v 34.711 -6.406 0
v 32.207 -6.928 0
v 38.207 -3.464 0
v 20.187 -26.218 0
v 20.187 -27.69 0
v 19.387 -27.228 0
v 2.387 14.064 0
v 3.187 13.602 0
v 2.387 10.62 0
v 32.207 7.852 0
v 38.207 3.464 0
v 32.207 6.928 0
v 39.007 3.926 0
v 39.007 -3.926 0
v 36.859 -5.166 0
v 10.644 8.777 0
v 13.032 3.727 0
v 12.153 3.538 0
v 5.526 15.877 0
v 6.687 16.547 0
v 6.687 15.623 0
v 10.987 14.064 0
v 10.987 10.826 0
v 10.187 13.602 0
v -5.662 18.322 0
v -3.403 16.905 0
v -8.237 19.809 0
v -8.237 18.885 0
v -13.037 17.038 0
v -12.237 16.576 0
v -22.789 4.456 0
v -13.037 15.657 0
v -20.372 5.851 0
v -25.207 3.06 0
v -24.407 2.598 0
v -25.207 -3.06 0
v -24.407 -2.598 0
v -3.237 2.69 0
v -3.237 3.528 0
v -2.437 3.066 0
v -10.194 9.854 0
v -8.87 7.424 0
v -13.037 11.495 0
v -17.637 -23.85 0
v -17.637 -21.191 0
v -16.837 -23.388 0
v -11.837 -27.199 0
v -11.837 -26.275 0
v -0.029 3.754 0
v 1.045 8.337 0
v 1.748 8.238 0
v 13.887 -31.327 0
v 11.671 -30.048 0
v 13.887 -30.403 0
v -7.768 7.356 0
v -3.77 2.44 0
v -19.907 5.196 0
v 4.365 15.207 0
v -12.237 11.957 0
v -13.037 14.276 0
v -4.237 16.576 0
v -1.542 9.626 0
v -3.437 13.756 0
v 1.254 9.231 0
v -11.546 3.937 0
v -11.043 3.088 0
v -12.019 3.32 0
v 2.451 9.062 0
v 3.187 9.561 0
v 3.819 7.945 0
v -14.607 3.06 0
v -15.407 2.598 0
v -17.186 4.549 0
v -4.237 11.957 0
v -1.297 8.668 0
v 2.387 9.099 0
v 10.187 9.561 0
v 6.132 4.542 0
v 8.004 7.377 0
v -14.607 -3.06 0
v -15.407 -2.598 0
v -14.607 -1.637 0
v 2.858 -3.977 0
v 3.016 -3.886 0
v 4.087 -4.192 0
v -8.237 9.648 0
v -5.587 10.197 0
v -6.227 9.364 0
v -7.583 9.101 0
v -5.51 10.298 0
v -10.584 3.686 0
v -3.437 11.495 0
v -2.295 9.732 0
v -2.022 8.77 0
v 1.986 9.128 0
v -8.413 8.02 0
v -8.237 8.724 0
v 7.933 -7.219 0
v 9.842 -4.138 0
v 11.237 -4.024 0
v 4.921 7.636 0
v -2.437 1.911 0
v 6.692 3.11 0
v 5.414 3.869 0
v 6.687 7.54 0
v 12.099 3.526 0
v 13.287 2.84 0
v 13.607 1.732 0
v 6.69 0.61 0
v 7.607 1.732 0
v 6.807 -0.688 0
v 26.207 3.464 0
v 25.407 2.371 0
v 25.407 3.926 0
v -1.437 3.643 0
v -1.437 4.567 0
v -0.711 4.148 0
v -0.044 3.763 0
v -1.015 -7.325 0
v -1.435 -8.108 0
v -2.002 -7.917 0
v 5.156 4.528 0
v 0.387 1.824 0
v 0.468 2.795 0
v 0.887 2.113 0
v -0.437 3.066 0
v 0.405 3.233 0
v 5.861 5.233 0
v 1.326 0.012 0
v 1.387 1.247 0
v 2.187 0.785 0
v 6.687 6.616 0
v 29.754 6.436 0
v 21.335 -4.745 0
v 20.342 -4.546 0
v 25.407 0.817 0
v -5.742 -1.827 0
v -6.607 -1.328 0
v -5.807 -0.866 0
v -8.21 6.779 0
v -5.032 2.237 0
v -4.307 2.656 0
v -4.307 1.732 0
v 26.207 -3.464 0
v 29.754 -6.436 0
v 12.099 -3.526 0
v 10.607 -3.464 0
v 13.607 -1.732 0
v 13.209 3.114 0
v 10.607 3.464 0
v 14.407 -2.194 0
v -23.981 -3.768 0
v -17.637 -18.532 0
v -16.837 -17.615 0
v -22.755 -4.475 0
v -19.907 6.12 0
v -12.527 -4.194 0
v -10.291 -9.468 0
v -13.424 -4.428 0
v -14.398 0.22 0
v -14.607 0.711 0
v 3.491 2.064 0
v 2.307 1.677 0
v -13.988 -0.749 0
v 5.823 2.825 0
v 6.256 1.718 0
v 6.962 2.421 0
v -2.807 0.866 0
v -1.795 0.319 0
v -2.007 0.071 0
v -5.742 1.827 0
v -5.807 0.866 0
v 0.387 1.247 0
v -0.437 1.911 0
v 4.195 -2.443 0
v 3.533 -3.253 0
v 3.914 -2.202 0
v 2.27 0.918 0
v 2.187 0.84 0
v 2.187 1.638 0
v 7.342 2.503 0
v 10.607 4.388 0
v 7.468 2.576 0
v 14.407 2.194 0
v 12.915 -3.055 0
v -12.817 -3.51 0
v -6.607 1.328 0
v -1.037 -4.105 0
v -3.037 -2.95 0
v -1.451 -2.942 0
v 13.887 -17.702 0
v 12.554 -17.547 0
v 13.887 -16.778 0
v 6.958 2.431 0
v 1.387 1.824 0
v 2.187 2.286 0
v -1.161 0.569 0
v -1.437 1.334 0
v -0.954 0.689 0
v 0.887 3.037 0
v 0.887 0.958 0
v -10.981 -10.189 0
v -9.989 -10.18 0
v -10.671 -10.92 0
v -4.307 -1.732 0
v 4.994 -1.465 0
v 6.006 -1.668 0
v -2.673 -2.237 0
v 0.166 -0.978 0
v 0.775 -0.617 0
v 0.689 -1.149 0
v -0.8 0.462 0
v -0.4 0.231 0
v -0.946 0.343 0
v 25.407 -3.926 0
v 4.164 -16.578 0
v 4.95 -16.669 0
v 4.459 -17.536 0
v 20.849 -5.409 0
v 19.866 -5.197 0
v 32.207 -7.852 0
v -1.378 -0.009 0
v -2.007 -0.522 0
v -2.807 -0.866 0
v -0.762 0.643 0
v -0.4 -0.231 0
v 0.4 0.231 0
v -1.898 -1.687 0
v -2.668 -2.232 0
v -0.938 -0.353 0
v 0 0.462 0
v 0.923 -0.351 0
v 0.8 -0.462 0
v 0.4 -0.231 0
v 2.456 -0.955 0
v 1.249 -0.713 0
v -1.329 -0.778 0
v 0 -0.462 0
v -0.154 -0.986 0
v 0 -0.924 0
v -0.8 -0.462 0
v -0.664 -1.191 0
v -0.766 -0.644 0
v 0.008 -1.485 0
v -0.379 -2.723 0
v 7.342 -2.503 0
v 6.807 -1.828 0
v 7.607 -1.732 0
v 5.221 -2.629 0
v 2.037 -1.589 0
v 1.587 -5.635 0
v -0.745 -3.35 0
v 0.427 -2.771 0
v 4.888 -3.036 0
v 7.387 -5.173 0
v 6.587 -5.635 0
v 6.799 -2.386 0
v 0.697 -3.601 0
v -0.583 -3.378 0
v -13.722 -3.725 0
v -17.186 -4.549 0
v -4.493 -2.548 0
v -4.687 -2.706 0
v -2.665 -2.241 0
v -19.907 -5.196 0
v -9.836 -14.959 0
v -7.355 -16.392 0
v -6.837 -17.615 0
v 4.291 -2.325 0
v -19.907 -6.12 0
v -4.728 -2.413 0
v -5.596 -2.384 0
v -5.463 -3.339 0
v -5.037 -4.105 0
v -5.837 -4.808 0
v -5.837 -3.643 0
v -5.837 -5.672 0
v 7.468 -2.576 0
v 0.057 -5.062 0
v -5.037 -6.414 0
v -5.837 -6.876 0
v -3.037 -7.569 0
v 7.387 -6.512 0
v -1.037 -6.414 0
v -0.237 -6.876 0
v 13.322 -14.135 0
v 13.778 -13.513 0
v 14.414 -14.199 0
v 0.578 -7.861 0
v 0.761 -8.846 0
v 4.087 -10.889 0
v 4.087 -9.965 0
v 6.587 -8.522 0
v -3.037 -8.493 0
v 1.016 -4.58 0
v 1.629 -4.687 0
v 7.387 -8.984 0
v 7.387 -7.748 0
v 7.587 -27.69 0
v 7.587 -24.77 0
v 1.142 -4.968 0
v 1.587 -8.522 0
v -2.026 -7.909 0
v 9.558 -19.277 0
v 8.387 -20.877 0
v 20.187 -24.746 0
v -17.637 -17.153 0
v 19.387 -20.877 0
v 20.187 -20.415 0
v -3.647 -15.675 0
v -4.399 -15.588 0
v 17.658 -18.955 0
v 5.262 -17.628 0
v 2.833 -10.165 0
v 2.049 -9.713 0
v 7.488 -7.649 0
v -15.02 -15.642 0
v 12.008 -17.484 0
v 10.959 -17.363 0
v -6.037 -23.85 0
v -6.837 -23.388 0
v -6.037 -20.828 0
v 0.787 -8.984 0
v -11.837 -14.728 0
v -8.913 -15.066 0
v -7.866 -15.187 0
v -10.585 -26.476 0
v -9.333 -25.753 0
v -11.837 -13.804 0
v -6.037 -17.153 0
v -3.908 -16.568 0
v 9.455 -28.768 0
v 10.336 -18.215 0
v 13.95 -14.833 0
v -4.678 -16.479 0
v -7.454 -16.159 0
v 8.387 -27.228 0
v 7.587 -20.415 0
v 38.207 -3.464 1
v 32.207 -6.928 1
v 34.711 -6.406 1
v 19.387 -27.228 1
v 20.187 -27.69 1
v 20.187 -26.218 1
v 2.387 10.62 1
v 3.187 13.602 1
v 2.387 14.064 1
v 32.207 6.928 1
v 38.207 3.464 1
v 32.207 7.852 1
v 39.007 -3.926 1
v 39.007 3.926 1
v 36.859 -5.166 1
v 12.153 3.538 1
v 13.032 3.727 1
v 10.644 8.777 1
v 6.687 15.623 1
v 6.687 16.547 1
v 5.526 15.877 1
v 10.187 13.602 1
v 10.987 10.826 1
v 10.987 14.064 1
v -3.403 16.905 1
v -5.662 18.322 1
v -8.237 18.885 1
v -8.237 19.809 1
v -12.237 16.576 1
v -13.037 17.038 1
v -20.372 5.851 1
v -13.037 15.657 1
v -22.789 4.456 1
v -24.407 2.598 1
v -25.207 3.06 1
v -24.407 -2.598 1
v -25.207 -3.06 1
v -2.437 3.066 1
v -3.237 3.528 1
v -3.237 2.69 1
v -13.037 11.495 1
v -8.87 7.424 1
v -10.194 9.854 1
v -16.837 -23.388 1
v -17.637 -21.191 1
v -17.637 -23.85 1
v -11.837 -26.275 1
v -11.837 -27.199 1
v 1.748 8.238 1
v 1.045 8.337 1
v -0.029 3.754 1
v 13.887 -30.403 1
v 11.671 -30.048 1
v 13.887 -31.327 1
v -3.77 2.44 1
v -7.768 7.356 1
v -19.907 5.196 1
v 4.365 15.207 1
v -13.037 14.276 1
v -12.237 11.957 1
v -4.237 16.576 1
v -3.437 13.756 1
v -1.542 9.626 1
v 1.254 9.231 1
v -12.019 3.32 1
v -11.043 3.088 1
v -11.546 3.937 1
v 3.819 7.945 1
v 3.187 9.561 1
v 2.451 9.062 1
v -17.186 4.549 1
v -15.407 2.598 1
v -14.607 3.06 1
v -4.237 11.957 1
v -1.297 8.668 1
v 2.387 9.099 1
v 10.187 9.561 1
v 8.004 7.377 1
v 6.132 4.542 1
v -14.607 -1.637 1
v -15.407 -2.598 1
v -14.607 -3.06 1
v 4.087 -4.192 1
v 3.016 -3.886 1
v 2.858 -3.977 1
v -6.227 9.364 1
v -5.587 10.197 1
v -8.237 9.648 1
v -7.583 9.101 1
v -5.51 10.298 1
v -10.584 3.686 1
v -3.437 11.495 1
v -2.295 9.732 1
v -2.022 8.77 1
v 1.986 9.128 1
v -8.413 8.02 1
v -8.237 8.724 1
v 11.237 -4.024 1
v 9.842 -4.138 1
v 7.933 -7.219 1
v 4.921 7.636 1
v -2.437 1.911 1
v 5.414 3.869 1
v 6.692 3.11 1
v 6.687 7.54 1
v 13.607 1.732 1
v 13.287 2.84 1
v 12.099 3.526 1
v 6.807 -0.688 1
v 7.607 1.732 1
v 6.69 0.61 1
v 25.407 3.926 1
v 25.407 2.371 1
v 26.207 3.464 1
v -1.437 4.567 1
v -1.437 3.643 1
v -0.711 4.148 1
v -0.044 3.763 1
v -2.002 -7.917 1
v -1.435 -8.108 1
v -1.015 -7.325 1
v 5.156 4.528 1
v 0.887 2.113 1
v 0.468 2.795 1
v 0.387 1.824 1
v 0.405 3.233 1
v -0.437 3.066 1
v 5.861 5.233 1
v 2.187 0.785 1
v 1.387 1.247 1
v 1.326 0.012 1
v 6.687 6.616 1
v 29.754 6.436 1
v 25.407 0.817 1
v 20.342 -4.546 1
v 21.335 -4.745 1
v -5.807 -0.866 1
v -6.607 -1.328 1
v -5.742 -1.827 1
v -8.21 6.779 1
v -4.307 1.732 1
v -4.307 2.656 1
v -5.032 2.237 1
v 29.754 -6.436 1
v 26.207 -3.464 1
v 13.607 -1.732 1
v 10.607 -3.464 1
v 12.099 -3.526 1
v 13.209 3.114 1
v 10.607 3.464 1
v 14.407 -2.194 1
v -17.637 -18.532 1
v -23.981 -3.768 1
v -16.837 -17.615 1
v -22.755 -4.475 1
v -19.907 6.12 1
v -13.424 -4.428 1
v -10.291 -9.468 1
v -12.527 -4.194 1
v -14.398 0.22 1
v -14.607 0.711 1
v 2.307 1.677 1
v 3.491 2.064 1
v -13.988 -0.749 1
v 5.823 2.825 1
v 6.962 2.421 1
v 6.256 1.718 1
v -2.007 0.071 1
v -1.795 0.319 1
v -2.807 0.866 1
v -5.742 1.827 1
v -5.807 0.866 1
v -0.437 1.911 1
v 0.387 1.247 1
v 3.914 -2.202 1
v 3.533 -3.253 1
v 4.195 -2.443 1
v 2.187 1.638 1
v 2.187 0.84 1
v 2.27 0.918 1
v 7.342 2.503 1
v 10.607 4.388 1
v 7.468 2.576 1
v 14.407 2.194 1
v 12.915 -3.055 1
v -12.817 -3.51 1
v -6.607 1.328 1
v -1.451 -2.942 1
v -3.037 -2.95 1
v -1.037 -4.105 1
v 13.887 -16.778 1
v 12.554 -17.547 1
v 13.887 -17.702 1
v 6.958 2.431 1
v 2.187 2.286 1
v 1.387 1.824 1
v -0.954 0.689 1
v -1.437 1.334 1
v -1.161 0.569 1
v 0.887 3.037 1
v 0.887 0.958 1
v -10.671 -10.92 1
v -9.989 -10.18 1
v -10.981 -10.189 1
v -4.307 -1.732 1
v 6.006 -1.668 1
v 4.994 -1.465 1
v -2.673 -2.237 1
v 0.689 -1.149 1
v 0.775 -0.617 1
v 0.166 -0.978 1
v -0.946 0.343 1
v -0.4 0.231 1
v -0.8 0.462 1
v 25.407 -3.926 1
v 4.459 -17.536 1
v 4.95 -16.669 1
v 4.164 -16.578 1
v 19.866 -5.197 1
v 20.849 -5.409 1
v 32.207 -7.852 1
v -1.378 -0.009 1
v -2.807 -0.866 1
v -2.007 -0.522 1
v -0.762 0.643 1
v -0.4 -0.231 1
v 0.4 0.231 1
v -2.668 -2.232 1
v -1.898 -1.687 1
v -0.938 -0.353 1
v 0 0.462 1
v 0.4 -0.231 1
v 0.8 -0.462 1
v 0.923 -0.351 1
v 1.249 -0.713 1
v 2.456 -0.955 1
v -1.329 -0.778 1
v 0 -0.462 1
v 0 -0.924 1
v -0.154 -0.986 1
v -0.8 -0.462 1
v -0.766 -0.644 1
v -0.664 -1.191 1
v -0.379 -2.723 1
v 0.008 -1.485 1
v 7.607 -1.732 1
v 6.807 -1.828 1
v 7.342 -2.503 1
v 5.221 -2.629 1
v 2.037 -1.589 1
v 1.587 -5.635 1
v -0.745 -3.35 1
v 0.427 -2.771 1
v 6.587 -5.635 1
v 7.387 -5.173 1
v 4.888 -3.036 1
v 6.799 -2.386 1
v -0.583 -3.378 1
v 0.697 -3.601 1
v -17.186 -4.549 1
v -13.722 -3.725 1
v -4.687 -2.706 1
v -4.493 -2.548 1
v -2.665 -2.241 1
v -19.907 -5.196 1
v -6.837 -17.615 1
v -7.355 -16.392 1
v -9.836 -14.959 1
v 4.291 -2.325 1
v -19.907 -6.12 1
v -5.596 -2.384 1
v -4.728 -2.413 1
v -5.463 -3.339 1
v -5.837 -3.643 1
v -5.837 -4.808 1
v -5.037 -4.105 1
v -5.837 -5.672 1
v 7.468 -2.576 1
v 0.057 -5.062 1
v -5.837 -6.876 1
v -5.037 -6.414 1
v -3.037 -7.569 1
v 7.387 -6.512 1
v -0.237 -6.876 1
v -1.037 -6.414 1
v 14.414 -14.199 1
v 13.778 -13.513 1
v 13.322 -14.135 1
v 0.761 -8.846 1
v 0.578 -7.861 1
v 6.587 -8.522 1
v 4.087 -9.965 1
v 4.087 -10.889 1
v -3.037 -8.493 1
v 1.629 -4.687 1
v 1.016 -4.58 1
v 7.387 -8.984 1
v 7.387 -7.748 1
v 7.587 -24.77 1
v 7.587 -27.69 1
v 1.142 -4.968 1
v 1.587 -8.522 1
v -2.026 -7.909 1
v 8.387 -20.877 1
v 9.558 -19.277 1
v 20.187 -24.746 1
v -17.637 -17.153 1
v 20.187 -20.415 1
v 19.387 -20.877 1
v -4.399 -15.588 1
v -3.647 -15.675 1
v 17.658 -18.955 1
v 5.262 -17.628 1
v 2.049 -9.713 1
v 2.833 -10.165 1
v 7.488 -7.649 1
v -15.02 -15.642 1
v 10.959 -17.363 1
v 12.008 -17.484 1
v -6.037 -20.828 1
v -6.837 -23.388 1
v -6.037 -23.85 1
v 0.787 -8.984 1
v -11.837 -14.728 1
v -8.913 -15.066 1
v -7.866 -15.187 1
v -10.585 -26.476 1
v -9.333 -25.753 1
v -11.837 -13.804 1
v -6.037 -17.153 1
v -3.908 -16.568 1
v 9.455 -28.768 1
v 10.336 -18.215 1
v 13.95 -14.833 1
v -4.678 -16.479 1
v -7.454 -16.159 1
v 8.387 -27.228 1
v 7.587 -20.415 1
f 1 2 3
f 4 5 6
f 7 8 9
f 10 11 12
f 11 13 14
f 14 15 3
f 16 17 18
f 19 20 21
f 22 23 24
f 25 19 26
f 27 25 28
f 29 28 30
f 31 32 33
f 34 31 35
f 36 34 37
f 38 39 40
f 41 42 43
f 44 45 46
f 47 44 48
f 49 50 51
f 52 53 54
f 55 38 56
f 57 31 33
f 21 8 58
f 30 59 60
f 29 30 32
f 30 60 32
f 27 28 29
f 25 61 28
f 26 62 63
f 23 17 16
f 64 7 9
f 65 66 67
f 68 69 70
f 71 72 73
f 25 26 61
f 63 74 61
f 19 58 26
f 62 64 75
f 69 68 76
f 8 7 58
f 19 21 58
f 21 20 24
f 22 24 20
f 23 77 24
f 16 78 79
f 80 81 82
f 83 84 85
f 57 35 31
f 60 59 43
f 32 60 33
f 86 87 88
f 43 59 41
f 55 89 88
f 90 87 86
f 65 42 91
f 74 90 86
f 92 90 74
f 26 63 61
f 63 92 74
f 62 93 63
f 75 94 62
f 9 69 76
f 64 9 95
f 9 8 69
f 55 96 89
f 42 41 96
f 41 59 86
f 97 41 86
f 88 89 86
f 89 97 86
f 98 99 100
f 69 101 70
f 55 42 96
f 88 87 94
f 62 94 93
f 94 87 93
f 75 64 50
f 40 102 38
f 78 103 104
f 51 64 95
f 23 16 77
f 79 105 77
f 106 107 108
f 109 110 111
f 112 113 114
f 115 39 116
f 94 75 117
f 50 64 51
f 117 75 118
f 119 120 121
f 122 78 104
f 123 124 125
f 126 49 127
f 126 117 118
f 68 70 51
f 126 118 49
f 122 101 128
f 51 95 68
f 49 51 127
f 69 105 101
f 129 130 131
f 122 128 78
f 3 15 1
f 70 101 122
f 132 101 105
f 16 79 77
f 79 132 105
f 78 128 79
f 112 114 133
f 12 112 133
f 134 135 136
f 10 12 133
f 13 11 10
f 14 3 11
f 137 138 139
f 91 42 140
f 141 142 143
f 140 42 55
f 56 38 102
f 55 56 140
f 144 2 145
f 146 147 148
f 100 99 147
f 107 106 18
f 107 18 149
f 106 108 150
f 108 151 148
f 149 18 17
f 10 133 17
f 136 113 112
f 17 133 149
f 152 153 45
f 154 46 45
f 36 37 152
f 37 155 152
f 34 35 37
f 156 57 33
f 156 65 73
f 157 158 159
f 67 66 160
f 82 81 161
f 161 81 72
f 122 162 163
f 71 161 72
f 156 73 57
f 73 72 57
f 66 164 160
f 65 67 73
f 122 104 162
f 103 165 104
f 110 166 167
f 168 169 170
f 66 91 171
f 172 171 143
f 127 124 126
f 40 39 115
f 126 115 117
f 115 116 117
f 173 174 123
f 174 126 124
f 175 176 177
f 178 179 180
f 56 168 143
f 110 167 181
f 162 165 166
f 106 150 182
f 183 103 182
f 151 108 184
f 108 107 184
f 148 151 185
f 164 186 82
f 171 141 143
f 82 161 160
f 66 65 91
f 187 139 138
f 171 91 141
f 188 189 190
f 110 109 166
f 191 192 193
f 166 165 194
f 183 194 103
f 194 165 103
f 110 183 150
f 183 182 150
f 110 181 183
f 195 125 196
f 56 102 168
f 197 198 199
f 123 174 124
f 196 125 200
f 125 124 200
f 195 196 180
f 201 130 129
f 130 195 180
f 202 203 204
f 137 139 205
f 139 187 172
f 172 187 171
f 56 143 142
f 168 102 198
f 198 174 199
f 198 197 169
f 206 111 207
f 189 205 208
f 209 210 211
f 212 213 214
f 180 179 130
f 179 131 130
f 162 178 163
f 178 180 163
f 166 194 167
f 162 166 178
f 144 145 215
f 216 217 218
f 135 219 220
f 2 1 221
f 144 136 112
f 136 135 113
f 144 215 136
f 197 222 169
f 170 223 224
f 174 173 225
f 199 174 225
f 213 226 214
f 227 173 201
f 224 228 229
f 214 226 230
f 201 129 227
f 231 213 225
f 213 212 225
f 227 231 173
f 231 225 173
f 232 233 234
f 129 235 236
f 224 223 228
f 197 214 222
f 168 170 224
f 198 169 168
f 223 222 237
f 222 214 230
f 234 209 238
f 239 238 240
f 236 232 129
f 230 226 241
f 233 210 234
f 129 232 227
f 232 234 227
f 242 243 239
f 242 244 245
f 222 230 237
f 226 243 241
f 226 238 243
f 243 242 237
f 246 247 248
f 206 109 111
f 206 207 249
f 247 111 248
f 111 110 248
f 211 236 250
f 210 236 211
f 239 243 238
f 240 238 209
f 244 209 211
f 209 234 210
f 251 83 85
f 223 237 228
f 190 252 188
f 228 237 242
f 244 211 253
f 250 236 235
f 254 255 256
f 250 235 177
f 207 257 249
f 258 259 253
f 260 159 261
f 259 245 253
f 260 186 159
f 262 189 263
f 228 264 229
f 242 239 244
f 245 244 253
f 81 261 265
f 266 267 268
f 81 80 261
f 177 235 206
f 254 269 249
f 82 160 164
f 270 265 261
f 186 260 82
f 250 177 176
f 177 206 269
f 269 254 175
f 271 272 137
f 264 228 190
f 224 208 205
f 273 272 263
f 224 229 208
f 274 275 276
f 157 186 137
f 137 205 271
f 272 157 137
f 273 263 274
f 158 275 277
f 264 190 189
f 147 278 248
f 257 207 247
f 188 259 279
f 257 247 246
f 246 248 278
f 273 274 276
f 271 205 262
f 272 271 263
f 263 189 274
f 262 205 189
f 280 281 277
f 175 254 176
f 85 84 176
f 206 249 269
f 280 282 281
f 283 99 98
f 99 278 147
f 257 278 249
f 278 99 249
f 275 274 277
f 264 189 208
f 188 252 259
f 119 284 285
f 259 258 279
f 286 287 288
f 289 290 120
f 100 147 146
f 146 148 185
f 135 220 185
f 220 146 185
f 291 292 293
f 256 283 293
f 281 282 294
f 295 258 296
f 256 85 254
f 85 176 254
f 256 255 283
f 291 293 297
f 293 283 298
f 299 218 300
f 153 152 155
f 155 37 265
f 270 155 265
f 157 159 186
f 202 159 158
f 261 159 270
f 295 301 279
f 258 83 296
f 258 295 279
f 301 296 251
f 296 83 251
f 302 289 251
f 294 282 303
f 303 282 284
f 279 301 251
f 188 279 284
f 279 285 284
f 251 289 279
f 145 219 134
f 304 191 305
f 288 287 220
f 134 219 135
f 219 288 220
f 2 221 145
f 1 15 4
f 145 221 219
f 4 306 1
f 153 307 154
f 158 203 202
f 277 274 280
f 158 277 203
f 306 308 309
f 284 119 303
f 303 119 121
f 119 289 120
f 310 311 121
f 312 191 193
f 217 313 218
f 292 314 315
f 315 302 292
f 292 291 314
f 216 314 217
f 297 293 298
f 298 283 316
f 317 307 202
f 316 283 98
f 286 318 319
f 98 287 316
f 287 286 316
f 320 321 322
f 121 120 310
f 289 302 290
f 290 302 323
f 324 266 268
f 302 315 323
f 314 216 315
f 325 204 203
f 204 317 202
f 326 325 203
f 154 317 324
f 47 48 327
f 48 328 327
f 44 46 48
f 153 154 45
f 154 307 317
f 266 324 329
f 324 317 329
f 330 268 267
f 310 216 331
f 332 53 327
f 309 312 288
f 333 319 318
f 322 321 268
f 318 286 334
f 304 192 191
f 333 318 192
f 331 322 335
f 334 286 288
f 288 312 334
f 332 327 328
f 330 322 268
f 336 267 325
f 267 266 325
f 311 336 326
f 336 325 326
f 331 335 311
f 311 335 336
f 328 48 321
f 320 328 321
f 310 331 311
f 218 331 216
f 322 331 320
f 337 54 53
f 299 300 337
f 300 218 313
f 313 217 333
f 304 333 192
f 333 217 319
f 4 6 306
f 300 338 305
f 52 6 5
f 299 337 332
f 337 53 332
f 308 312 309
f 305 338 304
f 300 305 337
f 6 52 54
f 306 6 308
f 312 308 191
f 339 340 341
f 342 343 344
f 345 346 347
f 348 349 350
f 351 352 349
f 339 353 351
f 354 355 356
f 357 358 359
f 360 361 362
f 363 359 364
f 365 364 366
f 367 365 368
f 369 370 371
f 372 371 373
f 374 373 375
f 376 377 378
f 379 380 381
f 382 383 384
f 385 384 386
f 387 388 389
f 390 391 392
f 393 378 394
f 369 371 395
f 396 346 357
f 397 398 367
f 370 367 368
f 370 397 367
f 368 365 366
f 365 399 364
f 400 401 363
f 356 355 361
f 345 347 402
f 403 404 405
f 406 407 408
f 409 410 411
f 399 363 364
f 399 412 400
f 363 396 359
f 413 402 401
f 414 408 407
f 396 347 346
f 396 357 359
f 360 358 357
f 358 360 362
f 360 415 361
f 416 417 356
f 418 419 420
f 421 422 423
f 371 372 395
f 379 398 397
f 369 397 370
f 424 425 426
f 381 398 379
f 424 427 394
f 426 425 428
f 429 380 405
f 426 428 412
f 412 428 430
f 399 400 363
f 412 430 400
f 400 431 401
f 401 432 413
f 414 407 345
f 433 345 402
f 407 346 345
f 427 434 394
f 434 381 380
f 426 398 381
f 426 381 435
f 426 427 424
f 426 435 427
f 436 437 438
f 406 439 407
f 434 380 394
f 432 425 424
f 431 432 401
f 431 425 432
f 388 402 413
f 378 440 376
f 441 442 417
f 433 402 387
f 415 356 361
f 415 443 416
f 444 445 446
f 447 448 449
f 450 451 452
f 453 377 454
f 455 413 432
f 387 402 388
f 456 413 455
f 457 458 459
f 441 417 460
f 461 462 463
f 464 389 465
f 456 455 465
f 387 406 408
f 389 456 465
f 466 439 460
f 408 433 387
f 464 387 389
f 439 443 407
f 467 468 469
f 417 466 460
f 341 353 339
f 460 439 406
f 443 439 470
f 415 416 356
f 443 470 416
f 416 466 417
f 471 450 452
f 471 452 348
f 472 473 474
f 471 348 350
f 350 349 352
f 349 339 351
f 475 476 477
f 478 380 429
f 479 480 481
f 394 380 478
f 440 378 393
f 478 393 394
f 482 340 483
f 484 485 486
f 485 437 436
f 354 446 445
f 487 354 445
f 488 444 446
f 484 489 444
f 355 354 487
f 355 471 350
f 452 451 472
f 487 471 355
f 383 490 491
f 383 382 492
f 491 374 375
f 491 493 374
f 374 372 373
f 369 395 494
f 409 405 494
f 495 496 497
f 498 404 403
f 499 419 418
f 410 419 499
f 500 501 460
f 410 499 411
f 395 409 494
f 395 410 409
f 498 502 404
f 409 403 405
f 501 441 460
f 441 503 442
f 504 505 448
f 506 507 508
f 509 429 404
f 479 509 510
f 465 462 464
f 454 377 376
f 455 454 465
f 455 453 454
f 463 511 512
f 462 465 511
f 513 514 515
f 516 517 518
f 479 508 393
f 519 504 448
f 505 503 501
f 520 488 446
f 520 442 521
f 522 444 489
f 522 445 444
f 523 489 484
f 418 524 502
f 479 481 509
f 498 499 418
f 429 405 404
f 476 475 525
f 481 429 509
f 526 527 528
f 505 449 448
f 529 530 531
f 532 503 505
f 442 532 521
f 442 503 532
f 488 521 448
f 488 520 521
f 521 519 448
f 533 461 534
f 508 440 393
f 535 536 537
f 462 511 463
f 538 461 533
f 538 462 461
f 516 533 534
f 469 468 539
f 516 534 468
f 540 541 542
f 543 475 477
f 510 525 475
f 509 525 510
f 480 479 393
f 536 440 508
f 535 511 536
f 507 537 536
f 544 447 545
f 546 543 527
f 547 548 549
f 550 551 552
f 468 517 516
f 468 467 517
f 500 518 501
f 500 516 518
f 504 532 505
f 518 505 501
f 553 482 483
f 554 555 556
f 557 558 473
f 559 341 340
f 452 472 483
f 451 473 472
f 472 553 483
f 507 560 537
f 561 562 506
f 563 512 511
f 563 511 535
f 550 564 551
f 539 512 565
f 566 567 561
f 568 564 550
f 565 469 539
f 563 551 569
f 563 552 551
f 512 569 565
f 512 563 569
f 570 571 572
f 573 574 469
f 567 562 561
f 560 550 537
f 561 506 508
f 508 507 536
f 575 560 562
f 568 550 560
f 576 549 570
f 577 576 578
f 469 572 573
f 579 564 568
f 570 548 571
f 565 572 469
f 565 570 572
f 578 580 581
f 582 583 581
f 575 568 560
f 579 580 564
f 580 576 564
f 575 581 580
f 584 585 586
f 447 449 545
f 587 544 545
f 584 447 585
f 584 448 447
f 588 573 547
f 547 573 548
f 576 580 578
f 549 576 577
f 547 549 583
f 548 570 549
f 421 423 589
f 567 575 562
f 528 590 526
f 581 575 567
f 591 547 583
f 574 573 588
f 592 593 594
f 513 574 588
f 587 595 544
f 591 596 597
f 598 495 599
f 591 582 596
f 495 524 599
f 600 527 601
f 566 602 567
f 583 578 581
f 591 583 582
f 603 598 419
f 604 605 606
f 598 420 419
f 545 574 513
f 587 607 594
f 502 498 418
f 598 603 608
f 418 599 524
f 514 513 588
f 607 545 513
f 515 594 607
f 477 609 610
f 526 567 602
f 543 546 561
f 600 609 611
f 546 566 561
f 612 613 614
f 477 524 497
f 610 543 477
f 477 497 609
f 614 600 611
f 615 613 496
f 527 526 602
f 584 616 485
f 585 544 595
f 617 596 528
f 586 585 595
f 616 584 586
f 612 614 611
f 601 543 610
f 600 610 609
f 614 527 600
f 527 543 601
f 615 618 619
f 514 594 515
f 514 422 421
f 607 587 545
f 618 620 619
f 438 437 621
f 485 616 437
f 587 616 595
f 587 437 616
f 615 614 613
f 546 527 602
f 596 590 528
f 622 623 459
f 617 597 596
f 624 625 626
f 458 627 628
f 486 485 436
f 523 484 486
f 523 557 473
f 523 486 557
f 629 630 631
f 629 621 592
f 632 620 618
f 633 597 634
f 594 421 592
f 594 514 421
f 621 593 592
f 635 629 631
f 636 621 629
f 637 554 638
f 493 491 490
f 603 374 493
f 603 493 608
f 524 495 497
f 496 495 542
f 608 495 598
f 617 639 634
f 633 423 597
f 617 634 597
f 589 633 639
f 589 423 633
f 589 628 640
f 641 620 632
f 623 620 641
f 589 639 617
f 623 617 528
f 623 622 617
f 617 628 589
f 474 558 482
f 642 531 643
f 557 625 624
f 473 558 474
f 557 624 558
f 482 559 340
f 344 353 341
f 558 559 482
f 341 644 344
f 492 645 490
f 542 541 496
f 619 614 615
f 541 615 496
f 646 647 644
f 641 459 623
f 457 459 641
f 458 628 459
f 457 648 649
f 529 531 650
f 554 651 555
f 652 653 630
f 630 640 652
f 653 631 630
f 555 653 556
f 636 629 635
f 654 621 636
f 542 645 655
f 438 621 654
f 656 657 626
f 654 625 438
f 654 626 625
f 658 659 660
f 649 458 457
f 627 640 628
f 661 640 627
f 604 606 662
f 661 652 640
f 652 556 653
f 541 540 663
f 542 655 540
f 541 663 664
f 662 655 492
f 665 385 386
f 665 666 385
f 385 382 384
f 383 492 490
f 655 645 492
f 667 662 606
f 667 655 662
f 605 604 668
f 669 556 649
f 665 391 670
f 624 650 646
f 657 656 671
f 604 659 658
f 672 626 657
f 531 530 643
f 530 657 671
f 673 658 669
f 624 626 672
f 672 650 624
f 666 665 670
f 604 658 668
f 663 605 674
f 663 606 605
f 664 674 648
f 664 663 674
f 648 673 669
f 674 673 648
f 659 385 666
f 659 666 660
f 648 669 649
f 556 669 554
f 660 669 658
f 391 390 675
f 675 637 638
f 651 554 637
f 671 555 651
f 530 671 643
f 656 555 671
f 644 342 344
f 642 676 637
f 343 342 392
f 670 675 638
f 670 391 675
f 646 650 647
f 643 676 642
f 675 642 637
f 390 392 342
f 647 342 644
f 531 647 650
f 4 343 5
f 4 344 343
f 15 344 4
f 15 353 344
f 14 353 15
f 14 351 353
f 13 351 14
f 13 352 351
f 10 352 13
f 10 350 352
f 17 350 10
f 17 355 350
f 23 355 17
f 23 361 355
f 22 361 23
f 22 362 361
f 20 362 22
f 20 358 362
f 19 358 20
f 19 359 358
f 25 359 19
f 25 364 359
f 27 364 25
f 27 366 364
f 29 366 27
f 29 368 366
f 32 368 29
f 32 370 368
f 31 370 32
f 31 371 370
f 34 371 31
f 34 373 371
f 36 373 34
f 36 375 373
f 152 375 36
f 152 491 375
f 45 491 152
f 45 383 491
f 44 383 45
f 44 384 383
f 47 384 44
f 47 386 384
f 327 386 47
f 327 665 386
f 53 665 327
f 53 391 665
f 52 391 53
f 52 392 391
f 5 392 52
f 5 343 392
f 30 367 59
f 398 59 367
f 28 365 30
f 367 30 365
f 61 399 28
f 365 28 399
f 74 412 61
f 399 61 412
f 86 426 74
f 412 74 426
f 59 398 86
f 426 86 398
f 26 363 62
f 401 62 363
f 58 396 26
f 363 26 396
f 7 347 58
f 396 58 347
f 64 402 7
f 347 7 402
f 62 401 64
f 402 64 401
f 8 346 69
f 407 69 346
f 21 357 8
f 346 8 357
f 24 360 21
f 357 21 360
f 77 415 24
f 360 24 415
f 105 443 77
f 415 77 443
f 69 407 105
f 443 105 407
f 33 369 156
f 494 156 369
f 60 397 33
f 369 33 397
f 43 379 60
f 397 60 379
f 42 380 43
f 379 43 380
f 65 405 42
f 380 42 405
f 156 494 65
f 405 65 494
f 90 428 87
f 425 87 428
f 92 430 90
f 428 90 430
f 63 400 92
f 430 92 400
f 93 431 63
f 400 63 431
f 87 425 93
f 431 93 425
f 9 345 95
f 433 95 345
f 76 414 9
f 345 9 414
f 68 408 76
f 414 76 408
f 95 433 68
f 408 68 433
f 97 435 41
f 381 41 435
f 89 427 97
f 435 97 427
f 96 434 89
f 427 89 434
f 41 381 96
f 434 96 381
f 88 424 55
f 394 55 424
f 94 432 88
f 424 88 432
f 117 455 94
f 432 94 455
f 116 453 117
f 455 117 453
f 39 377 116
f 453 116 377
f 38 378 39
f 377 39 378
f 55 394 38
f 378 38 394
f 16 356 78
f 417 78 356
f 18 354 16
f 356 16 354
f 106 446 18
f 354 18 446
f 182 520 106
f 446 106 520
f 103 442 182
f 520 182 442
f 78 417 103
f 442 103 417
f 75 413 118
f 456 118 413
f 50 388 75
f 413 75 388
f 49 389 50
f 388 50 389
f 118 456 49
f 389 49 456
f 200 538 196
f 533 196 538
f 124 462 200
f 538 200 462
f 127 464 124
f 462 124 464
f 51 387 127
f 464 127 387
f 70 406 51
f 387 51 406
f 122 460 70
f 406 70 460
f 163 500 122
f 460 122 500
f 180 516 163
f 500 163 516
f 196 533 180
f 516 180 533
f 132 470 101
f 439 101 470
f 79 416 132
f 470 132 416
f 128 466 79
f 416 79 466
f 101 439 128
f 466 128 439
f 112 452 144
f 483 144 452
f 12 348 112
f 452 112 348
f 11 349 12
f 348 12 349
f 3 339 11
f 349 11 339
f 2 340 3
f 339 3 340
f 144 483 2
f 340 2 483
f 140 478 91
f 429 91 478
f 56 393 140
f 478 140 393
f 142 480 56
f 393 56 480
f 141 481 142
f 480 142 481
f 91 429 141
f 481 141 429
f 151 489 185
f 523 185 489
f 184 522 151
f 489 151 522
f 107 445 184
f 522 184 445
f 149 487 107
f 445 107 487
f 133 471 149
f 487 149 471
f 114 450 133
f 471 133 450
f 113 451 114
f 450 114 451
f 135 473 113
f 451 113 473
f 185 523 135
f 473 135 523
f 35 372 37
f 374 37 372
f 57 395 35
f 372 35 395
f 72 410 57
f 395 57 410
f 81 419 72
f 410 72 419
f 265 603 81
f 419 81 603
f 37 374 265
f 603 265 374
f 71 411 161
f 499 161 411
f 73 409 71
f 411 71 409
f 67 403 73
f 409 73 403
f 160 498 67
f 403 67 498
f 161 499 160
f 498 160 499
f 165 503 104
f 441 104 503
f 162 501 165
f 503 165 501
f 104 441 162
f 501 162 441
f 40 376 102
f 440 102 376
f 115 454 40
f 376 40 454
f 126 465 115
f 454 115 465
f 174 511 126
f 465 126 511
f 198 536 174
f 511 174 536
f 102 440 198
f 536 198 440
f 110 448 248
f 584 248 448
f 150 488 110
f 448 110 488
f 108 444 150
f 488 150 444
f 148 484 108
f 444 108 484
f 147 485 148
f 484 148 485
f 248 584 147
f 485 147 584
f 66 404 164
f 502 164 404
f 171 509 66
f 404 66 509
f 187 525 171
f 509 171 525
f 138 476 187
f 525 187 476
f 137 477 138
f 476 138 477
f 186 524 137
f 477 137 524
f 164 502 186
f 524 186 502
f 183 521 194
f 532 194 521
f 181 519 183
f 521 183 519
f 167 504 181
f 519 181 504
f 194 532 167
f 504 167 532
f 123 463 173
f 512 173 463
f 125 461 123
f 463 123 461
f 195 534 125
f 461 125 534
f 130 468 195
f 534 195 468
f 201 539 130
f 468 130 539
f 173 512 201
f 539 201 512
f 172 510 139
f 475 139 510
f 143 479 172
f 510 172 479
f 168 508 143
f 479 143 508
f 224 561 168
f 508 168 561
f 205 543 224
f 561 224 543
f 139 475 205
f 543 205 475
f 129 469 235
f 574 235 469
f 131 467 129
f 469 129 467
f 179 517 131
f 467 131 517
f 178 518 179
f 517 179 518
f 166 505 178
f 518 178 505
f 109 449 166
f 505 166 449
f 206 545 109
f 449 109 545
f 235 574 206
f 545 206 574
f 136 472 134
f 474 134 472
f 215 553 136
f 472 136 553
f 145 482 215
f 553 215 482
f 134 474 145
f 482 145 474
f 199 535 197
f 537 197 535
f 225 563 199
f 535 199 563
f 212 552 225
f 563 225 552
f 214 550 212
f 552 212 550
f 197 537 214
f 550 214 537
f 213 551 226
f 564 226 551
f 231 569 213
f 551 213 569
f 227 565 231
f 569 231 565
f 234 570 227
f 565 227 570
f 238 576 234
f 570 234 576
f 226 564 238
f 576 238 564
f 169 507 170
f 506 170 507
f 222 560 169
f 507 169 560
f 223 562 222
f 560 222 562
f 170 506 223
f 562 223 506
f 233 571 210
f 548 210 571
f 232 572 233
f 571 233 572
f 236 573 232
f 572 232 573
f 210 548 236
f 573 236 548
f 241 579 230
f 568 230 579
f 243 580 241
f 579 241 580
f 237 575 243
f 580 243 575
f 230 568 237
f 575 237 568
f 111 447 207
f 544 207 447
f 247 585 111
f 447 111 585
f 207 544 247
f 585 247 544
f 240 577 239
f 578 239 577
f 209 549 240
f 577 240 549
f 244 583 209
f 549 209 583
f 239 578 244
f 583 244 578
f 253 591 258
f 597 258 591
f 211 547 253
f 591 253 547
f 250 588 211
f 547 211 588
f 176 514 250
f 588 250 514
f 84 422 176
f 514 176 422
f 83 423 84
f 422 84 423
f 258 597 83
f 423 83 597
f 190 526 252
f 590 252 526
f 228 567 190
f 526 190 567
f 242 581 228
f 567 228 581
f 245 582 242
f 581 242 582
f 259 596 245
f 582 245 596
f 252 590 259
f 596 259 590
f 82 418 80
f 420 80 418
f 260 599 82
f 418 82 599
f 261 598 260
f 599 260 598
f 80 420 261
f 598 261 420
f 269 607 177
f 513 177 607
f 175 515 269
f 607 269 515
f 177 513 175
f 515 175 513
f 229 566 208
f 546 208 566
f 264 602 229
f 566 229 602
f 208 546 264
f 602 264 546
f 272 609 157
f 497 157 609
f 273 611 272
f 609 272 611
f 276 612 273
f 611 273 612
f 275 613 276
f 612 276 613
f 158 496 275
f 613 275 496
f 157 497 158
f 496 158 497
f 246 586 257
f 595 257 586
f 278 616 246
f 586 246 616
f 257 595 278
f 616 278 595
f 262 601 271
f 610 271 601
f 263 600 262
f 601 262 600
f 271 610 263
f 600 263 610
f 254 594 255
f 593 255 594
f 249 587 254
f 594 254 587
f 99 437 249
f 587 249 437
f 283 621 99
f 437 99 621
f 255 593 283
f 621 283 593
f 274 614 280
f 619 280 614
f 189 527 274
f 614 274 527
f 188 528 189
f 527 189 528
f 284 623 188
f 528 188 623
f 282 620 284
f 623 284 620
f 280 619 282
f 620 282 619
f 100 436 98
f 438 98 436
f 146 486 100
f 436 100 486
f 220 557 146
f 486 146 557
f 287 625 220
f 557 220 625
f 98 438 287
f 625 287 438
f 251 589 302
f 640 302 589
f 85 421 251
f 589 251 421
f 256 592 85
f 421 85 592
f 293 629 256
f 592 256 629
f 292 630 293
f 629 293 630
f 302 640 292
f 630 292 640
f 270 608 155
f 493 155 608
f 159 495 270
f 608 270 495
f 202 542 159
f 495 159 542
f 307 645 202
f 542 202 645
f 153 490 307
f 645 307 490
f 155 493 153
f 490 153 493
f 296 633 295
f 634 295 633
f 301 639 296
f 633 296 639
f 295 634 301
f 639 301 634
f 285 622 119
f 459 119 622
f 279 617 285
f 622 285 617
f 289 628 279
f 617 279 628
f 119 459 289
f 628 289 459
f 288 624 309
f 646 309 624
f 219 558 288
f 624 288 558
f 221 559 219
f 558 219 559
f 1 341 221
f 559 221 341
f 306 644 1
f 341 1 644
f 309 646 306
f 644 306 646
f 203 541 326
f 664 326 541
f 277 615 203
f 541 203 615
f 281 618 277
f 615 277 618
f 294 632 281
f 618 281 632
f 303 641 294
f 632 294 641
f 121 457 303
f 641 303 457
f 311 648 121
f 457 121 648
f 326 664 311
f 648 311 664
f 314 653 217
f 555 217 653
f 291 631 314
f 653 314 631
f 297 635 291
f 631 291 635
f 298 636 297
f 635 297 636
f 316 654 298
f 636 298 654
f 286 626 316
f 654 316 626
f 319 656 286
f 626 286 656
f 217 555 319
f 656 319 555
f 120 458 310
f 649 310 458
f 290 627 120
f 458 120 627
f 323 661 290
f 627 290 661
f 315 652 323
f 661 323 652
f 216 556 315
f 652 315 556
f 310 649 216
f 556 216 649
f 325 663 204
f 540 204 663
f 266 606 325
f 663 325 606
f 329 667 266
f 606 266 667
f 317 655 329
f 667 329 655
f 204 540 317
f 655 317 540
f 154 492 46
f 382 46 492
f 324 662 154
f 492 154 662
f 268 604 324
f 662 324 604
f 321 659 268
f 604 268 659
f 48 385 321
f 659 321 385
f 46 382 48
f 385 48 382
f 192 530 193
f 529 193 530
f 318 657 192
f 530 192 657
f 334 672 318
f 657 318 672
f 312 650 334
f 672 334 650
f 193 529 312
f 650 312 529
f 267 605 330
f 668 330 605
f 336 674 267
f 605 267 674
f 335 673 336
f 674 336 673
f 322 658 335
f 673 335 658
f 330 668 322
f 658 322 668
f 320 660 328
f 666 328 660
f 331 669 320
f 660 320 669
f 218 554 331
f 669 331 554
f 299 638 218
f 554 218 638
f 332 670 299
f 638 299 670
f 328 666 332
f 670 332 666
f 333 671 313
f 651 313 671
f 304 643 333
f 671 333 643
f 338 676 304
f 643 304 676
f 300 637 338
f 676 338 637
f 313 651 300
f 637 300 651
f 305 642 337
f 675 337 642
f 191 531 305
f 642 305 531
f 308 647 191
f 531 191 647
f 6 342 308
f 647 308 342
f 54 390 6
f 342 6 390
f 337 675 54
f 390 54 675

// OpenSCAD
// Bubble Test
wall_th=0.4;

module hex_2d(d=10.0,rot=0) {
  rotate(rot) render() intersection() {
	square([d,2*d],center=true);
	rotate(60) square([d,2*d],center=true);
	rotate(-60) square([d,2*d],center=true);
  }
}

module spiral_bubbles_body(n=5,wall_th=wall_th) {
  for(i=[1:n]) assign(a1=60*i,r1=(i+wall_th+1)*(i+wall_th+2)/6-(i-1)/6
		,a2=60*(i+1),r2=(i+wall_th+2)*(i+wall_th+3)/6-i/6
	) {
	if(i<n) difference() {
		hull() {
			rotate(a1) translate([r1,0]) hex_2d(d=i);
			rotate(a2) translate([r2,0]) hex_2d(d=i+1);
		}
		hull() {
			rotate(a1) translate([r1,0]) hex_2d(d=i-2*wall_th);
			rotate(a2) translate([r2,0]) hex_2d(d=i+1-2*wall_th);
		}
	}
	difference() {
	  hull() {
			rotate(a1) translate([r1,0]) hex_2d(d=i+2*wall_th);
			hex_2d(d=2*wall_th);
	  }
	  render() hull() {
			rotate(a1) translate([r1,0]) hex_2d(d=i);
			hex_2d(d=1.0*wall_th);
	  }
	}
	rotate(a1) translate([r1,0]) hex_2d(d=i+2*wall_th);
  }
}

module spiral_bubbles_holes(n=5,wall_th=wall_th,fact=2) {
  for(i=[1:n]) assign(a1=60*i,r1=(i+wall_th+1)*(i+wall_th+2)/6-(i-1)/6) {
	rotate(a1) translate([r1,0]) hex_2d(d=i);
  }
}

module spiral_bubbles_outline(n=5,wall_th=wall_th,fact=2,h=1.0) {
  linear_extrude(height=h) difference() {
    spiral_bubbles_body(n=n,fact=fact,wall_th=wall_th);
    spiral_bubbles_holes(n=n,fact=fact,wall_th=wall_th);
  }
}

spiral_bubbles_outline(n=12,fact=0.0,wall_th=2*wall_th);
